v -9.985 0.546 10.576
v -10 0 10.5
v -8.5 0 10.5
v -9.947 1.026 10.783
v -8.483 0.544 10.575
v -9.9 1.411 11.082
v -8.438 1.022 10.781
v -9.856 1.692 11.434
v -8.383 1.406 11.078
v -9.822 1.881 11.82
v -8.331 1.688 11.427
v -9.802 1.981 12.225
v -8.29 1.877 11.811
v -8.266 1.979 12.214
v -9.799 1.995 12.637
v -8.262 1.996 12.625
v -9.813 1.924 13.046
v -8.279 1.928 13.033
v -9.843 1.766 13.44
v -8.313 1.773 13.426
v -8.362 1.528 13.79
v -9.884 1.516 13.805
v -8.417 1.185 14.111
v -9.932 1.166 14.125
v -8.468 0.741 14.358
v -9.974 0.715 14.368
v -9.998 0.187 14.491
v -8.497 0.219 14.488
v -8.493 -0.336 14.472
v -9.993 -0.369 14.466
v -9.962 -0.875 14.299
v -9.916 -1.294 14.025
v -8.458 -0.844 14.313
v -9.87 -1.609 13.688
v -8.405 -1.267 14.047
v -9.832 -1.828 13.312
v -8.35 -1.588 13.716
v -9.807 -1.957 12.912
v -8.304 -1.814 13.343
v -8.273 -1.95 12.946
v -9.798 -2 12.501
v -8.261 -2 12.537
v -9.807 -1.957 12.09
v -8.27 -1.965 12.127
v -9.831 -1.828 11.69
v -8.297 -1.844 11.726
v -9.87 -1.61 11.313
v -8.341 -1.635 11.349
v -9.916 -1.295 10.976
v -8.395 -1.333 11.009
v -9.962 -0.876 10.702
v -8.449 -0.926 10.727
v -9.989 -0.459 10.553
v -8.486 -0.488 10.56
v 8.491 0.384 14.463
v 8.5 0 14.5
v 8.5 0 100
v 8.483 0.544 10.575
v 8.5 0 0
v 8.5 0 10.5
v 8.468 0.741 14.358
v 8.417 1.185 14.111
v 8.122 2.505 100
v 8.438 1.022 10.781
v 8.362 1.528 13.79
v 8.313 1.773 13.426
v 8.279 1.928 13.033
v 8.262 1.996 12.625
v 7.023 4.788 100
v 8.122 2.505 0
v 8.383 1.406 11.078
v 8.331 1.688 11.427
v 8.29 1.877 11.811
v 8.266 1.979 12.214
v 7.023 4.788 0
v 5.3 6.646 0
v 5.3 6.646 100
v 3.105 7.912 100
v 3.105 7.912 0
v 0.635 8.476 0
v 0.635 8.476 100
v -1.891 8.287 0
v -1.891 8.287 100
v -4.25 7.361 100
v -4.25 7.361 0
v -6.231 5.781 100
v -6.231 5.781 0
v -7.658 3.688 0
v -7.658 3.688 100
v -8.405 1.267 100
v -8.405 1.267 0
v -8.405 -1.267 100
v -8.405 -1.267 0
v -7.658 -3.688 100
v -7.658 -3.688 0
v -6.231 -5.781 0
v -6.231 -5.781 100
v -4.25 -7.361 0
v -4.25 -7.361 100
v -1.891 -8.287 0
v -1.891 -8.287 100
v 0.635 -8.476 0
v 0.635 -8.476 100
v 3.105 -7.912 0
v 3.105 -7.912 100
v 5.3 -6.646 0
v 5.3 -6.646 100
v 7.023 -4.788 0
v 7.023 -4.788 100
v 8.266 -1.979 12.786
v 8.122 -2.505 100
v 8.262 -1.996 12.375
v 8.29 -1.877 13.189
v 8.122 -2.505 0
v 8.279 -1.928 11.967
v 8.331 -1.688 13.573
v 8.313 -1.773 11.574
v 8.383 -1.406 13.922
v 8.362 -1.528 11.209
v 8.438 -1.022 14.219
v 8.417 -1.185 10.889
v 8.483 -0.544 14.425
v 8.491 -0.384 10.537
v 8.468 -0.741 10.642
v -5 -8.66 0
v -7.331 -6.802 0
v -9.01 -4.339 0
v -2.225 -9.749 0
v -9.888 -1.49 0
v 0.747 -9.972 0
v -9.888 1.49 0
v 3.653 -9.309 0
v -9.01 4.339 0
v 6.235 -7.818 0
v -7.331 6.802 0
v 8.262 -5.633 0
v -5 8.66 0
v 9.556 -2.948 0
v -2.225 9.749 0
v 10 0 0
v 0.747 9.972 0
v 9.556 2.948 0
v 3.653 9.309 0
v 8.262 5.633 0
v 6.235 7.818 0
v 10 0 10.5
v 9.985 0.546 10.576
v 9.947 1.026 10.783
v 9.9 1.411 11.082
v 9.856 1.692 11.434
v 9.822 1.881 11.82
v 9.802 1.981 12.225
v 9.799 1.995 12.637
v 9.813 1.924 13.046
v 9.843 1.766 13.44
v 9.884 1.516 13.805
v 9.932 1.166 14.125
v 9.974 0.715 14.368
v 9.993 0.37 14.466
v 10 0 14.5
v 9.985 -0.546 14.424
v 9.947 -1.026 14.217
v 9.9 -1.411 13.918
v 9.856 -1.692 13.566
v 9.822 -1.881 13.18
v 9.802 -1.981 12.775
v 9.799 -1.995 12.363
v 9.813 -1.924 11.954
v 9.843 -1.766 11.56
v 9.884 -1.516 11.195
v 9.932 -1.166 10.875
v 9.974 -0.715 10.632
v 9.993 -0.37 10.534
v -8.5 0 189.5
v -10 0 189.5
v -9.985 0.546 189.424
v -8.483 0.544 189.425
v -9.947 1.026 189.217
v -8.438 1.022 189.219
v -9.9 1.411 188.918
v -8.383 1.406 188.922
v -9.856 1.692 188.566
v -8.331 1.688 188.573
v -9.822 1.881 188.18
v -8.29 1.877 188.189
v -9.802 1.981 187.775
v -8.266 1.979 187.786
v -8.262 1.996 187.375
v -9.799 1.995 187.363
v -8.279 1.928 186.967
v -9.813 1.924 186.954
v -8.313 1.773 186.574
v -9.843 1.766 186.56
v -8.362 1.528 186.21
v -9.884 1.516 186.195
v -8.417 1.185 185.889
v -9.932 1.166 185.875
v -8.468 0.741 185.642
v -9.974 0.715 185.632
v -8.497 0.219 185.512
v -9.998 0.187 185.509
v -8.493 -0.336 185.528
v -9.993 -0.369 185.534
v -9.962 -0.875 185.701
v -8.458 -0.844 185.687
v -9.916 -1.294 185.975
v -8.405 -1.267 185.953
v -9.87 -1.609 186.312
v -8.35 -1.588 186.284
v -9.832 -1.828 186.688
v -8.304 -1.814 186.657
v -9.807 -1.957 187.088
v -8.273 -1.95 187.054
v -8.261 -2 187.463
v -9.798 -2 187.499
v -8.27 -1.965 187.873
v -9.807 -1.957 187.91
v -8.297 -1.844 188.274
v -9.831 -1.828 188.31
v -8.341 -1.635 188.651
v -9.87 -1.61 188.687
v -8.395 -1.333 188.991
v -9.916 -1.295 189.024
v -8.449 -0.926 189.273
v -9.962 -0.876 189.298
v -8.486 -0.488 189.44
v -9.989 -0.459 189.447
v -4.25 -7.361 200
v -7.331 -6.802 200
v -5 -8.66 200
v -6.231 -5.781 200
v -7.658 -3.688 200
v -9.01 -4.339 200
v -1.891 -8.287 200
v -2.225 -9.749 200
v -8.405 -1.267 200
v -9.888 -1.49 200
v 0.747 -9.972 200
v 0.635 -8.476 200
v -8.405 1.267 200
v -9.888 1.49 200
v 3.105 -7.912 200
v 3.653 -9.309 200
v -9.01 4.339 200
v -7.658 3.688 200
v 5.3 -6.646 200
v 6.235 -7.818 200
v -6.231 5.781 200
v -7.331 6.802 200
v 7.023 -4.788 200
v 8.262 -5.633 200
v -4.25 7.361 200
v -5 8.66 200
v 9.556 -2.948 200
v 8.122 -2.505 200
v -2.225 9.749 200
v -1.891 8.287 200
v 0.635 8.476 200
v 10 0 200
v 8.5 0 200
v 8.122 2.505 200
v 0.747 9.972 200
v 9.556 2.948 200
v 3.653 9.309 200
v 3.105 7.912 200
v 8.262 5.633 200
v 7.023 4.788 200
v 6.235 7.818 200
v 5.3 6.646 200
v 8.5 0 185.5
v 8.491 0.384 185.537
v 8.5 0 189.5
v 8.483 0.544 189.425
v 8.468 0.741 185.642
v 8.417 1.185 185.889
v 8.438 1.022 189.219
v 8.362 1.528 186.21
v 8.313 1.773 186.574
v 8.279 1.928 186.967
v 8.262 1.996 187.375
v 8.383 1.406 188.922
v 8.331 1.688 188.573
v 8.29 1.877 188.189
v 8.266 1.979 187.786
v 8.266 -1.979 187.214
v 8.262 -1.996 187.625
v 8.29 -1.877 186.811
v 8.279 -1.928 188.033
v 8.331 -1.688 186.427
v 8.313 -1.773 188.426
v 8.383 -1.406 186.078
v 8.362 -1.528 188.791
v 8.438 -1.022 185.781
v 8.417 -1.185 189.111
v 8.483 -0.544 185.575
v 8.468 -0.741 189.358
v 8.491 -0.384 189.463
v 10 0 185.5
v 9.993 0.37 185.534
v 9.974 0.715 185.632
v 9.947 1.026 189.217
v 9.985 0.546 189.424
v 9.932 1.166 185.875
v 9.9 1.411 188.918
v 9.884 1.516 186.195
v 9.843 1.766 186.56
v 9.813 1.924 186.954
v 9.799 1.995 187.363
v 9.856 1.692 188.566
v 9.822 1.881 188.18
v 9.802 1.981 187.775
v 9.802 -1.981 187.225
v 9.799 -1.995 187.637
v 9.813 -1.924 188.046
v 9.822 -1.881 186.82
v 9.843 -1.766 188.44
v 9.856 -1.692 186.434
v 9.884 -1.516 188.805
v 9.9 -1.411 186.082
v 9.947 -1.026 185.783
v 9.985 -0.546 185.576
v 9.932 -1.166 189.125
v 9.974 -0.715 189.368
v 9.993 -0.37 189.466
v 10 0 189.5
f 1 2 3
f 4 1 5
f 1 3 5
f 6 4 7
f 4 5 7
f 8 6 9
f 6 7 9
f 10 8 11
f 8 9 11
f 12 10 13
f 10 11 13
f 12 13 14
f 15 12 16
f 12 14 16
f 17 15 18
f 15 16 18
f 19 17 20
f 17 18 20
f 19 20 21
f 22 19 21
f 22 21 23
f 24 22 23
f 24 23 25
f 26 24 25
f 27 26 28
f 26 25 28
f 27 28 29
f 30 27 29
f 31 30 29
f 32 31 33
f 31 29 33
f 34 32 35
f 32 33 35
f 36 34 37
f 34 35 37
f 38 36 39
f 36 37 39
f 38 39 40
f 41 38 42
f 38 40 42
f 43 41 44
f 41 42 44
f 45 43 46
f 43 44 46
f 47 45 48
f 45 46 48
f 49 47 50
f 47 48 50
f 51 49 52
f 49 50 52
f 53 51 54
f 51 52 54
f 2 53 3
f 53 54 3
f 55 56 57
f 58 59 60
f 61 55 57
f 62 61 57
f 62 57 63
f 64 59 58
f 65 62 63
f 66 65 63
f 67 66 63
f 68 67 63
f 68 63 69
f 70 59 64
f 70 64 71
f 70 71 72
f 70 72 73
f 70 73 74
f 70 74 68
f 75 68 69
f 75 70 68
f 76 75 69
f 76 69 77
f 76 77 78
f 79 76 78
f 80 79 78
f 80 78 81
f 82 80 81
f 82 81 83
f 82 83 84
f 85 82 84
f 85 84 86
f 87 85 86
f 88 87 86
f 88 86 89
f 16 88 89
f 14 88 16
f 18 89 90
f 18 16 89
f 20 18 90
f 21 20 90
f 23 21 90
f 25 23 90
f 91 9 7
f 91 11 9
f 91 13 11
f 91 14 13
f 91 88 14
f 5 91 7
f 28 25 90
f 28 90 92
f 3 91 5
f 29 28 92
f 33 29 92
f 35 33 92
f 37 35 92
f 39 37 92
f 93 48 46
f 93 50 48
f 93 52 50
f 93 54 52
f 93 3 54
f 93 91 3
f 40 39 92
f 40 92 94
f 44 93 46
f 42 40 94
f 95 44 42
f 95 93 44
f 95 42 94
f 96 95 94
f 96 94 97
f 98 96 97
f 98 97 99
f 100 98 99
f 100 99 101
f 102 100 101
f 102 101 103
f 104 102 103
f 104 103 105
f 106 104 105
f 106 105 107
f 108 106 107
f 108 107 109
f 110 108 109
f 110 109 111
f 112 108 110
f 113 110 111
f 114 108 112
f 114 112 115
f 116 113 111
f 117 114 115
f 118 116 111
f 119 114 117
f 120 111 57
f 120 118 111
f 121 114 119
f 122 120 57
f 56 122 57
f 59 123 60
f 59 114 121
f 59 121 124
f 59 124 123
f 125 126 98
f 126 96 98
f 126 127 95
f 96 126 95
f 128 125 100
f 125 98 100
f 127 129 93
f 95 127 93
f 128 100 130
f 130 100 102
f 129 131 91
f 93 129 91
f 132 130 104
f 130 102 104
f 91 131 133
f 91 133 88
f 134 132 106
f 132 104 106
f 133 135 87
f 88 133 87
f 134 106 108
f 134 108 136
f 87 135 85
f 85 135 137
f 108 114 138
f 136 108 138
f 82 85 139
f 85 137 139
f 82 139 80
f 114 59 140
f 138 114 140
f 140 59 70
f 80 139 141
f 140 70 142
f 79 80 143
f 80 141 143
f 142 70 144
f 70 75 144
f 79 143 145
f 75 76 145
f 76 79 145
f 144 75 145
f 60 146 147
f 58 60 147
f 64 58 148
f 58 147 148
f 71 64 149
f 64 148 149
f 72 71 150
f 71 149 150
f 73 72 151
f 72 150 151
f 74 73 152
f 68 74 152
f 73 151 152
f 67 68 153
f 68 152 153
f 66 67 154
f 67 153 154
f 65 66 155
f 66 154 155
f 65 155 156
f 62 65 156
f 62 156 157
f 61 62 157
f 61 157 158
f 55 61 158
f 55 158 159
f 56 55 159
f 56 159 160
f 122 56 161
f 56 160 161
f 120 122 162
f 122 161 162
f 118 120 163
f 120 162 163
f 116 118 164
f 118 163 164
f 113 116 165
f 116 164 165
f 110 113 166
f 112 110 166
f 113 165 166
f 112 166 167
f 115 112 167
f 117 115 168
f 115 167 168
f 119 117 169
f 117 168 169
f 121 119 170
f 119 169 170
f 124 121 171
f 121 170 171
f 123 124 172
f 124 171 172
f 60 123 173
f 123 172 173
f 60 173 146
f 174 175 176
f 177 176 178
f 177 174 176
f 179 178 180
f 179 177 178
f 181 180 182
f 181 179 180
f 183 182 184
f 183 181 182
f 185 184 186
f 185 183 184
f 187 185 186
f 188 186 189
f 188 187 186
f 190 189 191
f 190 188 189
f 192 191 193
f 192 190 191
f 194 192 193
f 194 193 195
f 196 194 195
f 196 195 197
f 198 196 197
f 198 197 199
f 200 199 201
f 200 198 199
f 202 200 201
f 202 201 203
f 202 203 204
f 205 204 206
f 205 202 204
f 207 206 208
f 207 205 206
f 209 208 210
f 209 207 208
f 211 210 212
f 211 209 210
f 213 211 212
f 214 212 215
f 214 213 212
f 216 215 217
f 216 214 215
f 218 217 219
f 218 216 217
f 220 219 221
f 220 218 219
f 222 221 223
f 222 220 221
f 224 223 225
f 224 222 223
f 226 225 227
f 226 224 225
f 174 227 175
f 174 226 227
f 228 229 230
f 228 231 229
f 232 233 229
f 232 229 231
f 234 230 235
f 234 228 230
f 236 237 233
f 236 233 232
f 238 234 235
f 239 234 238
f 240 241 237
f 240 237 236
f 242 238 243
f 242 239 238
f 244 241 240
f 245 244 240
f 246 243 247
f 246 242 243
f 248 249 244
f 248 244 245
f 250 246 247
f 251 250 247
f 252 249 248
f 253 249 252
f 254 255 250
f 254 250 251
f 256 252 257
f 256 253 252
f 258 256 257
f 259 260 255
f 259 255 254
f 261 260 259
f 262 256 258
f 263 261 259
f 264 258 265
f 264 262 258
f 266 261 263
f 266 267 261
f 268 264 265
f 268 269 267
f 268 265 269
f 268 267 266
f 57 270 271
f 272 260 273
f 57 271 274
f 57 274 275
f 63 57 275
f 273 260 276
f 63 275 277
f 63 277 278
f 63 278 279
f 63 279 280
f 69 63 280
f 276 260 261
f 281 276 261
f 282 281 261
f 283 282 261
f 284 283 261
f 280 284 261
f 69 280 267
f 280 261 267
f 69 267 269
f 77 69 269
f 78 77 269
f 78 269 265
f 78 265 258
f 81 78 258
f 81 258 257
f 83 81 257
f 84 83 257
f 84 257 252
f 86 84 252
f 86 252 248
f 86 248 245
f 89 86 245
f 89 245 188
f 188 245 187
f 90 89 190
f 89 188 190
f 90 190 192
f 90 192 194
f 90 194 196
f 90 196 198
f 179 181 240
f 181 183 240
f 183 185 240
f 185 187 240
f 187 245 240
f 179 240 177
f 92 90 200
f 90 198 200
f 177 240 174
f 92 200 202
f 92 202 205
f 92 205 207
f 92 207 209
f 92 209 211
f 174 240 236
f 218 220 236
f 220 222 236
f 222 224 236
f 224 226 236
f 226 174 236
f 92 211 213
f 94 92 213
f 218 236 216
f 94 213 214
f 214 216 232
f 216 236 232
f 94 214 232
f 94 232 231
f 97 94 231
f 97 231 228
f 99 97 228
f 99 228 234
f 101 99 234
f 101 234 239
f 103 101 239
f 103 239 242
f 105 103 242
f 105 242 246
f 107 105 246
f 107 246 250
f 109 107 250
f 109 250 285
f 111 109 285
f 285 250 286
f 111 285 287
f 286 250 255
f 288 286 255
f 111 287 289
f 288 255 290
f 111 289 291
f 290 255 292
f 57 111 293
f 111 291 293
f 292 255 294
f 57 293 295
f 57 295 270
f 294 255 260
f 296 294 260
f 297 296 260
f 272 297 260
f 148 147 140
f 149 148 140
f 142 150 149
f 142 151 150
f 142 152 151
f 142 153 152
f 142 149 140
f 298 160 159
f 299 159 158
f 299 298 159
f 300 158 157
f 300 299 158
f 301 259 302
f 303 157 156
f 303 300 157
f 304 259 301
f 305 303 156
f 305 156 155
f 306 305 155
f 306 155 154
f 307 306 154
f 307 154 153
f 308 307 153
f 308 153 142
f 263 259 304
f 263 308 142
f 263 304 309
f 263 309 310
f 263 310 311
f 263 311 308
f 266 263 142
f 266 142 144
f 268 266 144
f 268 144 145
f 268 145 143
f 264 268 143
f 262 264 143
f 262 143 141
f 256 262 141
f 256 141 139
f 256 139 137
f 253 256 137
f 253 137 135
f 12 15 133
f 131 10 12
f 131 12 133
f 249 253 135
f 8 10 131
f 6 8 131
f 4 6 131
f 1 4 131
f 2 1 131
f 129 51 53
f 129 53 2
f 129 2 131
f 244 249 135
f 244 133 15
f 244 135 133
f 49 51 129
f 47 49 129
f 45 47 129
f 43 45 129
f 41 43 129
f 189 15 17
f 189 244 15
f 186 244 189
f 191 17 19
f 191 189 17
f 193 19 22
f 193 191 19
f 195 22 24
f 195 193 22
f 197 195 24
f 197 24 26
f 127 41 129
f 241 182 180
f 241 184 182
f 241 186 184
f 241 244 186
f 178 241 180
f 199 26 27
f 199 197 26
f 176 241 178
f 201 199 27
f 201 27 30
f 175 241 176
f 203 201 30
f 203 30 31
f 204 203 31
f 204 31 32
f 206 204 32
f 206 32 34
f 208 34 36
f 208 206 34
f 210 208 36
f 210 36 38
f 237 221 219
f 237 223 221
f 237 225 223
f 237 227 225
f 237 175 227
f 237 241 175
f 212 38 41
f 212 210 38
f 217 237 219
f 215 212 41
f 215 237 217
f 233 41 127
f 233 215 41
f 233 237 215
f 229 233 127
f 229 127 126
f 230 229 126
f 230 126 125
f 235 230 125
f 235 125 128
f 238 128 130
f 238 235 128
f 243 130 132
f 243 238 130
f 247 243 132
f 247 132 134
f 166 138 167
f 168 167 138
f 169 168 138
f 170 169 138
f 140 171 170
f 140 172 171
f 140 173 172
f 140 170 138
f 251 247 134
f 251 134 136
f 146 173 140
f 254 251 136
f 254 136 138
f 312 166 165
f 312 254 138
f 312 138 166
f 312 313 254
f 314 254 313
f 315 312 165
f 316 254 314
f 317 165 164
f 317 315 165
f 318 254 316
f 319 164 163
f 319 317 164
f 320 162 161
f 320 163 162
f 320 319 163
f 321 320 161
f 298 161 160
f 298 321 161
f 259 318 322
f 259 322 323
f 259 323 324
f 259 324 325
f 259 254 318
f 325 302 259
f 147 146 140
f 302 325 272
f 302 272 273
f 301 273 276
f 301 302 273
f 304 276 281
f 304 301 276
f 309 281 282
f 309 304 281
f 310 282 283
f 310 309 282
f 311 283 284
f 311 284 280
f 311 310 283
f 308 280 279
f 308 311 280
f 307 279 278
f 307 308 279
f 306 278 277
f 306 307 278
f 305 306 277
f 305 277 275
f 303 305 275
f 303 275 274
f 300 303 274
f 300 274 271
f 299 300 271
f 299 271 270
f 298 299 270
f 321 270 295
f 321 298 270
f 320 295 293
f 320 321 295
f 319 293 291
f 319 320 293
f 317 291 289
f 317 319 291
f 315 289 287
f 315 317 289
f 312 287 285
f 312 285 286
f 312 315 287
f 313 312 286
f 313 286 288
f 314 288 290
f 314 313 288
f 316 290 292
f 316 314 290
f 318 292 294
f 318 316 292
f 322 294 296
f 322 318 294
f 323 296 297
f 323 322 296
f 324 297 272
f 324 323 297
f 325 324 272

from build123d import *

# Parameters (mm, degrees)
SKETCH1_R           = 10
SKETCH1_R_2         = 8.5
BOSS_EXTRUDE1_DEPTH = 100
SKETCH2_R           = 2
CUT_EXTRUDE1_DEPTH  = 101.995049384


with BuildPart() as part:
    # Sketch1 → Boss-Extrude1 (new body)
    with BuildSketch(Plane.XY):
        Circle(SKETCH1_R)
        Circle(SKETCH1_R_2, mode=Mode.SUBTRACT)
    boss_extrude1 = extrude(amount=BOSS_EXTRUDE1_DEPTH)

    # Sketch2 → Cut-Extrude1 (cut, symmetric)
    with BuildSketch(Plane(origin=(0, 0, 0), x_dir=(0, 0, -1), z_dir=(1, 0, 0))):
        with Locations((-12.5, 0)):
            Circle(SKETCH2_R)
    cut_extrude1 = extrude(amount=CUT_EXTRUDE1_DEPTH, both=True, mode=Mode.SUBTRACT)

    # Mirror1: Boss-Extrude1, Cut-Extrude1 across plane
    add(boss_extrude1.mirror(Plane.XY.offset(100)))
    add(cut_extrude1.mirror(Plane.XY.offset(100)), mode=Mode.SUBTRACT)


solid = part.part
